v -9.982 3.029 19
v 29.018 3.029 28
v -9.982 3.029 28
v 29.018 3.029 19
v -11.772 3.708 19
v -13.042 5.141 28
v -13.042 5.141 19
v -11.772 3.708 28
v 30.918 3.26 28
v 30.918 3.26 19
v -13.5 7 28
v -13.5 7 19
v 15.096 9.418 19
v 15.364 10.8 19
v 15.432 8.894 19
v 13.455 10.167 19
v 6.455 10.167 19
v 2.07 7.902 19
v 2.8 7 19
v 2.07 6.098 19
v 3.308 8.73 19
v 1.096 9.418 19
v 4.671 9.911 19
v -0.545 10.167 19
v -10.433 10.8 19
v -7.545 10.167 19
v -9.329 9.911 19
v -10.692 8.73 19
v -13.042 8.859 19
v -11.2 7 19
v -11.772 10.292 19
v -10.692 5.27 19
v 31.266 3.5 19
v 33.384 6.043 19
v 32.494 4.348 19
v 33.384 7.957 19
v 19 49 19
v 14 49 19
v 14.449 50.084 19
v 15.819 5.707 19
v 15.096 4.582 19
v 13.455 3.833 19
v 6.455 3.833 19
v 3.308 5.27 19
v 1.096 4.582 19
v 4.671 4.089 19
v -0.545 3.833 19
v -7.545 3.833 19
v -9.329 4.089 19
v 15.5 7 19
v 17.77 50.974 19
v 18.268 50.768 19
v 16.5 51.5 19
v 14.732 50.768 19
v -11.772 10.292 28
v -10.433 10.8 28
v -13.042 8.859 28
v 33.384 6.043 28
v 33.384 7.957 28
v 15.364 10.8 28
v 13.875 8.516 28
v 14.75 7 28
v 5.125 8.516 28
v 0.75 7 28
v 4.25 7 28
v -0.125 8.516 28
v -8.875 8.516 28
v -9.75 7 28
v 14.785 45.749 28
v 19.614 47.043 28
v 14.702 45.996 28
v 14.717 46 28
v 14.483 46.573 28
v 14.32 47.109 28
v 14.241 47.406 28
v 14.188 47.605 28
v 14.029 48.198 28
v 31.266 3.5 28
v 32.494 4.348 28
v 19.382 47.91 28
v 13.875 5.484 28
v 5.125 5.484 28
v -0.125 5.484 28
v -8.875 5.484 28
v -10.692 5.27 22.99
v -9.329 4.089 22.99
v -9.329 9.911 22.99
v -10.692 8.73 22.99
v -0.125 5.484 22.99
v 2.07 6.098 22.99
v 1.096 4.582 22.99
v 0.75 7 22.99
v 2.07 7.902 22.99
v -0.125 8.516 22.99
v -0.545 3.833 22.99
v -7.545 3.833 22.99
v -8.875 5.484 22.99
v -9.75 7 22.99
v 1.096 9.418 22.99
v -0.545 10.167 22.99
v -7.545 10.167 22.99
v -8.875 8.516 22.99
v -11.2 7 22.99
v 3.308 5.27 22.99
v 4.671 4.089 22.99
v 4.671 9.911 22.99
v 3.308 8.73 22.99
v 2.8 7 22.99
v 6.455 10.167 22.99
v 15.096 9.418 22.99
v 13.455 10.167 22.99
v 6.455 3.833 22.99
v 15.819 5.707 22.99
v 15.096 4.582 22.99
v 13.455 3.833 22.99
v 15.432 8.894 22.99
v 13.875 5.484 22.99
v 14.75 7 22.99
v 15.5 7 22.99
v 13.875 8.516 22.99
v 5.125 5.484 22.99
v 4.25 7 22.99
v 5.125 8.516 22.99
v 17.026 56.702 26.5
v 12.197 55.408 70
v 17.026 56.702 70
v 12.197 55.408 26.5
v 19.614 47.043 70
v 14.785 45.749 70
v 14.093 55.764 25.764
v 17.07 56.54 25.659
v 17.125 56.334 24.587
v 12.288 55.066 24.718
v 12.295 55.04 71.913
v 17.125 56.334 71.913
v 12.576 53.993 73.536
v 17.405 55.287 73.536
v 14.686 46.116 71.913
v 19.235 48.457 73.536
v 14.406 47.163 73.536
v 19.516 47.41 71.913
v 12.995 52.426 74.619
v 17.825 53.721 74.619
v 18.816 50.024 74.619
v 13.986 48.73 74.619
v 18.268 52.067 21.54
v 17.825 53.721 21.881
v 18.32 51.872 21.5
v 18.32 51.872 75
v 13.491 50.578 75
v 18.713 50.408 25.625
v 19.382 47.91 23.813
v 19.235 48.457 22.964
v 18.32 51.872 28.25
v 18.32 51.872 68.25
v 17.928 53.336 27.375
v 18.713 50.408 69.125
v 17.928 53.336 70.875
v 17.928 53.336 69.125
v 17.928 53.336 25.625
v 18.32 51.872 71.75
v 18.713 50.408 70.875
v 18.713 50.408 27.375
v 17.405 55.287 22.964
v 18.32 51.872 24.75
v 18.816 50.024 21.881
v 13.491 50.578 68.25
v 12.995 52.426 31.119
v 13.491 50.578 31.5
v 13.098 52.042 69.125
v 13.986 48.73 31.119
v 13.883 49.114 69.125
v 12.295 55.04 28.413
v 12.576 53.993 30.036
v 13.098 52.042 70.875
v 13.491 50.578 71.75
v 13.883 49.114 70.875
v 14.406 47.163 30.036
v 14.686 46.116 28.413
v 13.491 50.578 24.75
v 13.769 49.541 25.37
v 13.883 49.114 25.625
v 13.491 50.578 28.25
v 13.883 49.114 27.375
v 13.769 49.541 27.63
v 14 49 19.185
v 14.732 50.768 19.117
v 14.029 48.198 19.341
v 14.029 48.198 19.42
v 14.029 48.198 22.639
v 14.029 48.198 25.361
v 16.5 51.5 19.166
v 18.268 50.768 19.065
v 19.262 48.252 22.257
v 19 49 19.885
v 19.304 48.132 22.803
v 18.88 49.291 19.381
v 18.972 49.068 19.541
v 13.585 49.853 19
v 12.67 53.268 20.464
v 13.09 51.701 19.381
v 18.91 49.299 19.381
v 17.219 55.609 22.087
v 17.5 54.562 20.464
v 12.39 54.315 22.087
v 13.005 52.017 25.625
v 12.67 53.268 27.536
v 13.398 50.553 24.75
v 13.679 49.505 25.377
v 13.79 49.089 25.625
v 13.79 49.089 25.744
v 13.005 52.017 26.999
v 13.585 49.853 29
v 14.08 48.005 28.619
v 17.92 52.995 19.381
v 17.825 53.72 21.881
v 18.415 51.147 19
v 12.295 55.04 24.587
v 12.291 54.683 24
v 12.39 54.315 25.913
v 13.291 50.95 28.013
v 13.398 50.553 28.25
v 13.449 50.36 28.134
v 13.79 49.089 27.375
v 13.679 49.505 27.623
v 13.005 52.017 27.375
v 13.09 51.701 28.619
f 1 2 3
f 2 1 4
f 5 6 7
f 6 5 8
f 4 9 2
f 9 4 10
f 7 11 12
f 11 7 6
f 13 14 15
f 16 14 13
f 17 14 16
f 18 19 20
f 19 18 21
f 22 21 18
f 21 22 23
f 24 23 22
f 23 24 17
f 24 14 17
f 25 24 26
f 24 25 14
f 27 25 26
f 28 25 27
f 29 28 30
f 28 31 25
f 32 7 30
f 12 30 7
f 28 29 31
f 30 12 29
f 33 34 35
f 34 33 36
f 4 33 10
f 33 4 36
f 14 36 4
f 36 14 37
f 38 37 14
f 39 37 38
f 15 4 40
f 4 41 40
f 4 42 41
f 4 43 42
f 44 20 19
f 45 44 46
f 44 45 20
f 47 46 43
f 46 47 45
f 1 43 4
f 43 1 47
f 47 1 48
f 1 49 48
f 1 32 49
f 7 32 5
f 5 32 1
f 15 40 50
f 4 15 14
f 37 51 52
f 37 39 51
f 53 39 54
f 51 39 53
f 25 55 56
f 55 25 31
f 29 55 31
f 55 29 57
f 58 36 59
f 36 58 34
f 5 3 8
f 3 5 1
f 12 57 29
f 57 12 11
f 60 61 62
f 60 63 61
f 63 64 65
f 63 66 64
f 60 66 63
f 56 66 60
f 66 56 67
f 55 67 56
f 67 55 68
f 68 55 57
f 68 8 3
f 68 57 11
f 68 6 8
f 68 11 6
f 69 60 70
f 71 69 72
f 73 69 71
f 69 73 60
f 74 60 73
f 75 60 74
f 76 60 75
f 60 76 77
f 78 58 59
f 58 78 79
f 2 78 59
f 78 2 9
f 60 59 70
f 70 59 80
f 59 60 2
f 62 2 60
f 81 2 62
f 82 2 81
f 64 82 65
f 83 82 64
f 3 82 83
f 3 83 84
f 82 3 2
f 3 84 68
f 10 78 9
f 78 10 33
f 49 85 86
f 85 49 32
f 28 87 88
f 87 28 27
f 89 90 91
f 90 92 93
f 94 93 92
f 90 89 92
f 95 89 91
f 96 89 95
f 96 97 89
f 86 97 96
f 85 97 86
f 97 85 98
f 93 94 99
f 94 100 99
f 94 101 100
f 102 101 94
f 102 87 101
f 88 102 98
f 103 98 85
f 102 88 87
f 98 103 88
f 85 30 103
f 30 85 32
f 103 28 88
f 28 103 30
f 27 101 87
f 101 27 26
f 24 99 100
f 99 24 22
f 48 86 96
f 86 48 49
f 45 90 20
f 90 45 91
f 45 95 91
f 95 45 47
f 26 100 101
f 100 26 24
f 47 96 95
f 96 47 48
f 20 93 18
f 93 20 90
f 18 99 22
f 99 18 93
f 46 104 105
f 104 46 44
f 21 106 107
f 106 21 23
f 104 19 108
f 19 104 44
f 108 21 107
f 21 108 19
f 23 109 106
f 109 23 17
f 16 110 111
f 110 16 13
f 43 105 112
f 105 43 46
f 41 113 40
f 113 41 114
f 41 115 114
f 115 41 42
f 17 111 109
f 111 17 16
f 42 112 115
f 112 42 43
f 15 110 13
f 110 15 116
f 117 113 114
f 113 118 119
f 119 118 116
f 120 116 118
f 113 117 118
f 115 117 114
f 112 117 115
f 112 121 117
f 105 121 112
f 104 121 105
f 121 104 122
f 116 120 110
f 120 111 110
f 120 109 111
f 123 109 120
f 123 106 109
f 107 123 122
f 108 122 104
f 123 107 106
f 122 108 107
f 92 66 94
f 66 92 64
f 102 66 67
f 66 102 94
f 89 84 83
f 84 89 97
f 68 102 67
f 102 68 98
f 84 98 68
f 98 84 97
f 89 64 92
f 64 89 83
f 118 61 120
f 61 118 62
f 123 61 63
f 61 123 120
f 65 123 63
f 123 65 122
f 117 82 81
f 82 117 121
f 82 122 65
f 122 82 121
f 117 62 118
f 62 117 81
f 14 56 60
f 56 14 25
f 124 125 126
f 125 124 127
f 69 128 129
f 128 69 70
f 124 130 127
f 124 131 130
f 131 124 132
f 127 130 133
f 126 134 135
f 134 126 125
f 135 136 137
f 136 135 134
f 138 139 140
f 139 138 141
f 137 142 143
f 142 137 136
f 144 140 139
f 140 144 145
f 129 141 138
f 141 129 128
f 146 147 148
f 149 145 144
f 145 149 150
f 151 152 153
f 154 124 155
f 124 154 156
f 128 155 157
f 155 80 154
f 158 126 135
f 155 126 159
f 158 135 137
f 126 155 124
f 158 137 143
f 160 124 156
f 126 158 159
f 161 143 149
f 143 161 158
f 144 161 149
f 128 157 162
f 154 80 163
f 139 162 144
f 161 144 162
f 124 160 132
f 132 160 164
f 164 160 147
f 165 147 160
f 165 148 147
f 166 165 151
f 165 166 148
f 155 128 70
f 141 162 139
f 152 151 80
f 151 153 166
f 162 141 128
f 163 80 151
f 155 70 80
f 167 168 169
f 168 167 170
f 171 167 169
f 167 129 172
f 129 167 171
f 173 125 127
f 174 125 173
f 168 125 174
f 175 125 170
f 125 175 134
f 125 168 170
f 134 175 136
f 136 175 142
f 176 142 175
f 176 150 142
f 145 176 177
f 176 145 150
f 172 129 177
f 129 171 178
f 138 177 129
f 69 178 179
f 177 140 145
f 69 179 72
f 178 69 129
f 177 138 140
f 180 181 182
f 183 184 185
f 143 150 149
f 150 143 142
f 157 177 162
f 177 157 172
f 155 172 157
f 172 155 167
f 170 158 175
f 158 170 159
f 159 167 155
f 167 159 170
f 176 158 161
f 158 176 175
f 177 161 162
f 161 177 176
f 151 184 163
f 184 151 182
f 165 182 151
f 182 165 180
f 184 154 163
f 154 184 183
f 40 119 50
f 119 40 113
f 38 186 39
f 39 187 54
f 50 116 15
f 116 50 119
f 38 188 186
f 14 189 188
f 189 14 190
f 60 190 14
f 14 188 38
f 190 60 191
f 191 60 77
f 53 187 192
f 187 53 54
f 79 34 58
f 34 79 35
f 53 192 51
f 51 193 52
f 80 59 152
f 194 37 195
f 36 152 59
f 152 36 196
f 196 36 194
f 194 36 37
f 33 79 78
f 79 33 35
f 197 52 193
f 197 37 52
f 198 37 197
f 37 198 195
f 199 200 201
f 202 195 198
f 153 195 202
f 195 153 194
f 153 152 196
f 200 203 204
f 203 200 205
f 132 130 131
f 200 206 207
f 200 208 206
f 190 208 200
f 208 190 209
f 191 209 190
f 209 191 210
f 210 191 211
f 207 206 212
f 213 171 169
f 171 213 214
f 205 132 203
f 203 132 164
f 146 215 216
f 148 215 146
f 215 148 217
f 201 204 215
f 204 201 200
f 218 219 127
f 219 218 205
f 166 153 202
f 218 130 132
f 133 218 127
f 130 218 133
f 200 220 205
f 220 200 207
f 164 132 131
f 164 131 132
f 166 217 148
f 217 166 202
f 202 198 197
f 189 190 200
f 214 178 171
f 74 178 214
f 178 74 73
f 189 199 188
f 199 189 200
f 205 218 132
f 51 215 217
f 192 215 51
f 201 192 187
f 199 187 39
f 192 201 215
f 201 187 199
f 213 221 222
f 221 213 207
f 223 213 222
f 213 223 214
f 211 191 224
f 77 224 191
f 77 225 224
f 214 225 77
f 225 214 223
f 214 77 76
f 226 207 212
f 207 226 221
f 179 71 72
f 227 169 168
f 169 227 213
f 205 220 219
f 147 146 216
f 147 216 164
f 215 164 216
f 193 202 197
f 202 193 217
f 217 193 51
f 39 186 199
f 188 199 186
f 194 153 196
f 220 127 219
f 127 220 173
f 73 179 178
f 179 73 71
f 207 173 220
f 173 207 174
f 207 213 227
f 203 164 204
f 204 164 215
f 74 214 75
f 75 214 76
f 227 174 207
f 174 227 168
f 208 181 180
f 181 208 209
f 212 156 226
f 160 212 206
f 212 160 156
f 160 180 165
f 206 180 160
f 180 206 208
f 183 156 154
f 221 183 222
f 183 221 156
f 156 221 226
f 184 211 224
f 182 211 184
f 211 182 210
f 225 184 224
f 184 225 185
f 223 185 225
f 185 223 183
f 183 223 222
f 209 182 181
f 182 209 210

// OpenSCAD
nozzle_w_t=1.2;
duct_w_t=nozzle_w_t;
nozzle_x =20;
nozzle_z= 6;
nozzle_y=5;
nozzle_taper_l=16;
duct_w=25;
duct_w2=38;
duct_h=20;
noz_a=20;
duct_a=-15;
duct_ir=32/2;
duct_depth=11;
m3r=1.75;
mount_c_h=6+duct_w_t+1;
mount_c_offset=duct_w/2+14;
mount_c_off_y=4;

nozzle_off_y=30;


module nozzle(right=1){
    difference(){
        //nozzle
        union(){
            hull(){
                rotate([noz_a,0,0])
                translate([0,0,0])
                    cube([nozzle_x,0.1,nozzle_z],center=true);
                translate([0,nozzle_y,0])
                    cube([nozzle_x,0.1,nozzle_z],center=true);
            }
            //fan interface
            hull(){
                translate([0,nozzle_y,0])
                    cube([nozzle_x,0.1,nozzle_z],center=true);
                translate([0,nozzle_taper_l-2,(nozzle_z-duct_h)/2])
                        cube([duct_w+nozzle_w_t*2,0.1,duct_h+nozzle_w_t*2],center=true);
                translate([(duct_w-duct_w2)/2,nozzle_taper_l+duct_depth,(nozzle_z-duct_h)/2])
                        cube([duct_w2+nozzle_w_t*2,0.1,duct_h+nozzle_w_t*2],center=true);            
            }
            //screw hole meat
            hull(){
                translate([-mount_c_offset,nozzle_taper_l+duct_depth-(m3r+2),-(duct_h-nozzle_z)/2-duct_h/2+mount_c_h/2-duct_w_t])
                cylinder(r=m3r+2, h=mount_c_h,center=true,$fn=20);
                translate([0,nozzle_taper_l+duct_depth-(m3r+2),-(duct_h-nozzle_z)/2-duct_h/2+mount_c_h/2-duct_w_t])
                cube([0.1,m3r*2+4,mount_c_h],center=true);
            }
            if(right){
                hull(){
                    translate([17,nozzle_taper_l+duct_depth-(m3r+2),-(duct_h-nozzle_z)/2])
                    cylinder(r=m3r+2, h=duct_h+duct_w_t*2,center=true,$fn=20);
                    translate([0,nozzle_taper_l+duct_depth-(m3r+2),-(duct_h-nozzle_z)/2])
                    cube([0.1,m3r*2+4,duct_h+duct_w_t*2],center=true);
                }
            }
        }      
        //nozzle cutout
        hull(){
            translate([0,-1,0])
            rotate([noz_a,0,0])
                cube([nozzle_x-nozzle_w_t*2,0.11,nozzle_z-nozzle_w_t*2],center=true);
            translate([0,nozzle_y+0.01,0])
                cube([nozzle_x-nozzle_w_t*2,0.11,nozzle_z-nozzle_w_t*2],center=true);

        }
        //fan interface cutout      
        hull(){
          translate([0,nozzle_y-0.01,0])
                cube([nozzle_x-nozzle_w_t*2,0.11,nozzle_z-nozzle_w_t*2],center=true);
            translate([0,nozzle_taper_l-0.01,(nozzle_z-duct_h)/2])
                    cube([duct_w,0.1,duct_h],center=true);
            translate([(duct_w-duct_w2)/2,nozzle_taper_l+duct_depth+0.01,(nozzle_z-duct_h)/2])
                    cube([duct_w2,0.1,duct_h],center=true);            
        }
        //screw hole
                translate([-mount_c_offset,nozzle_taper_l+duct_depth-(m3r+2),-(duct_h-nozzle_z)/2-duct_h/2+mount_c_h/2-duct_w_t])
                cylinder(r=m3r, h=mount_c_h+0.1,center=true,$fn=12);
            if(right){
                translate([17,nozzle_taper_l+duct_depth-(m3r+2),-(duct_h-nozzle_z)/2])
                cylinder(r=m3r, h=duct_h+duct_w_t*2+0.1,center=true,$fn=20);
            }        
        //cutout
       translate([-mount_c_offset,nozzle_taper_l+duct_depth-(m3r+2)+3,-(duct_h-nozzle_z)/2+mount_c_h/2])
        cube([12,12,duct_h-mount_c_h+duct_w_t*2+0.1],center=true);
        //cutout
        translate([duct_w/2,nozzle_taper_l+duct_depth-(m3r+2)+3,-(duct_h-nozzle_z)/2])
        cube([10,8,3],center=true); 
    }
    //vane
    hull(){
        rotate([noz_a,0,0])
        cube([0.8,0.1,nozzle_z],center=true);
        translate([0,nozzle_y,0])
            cube([0.8,0.1,nozzle_z],center=true);
    }
    hull(){
        translate([0,nozzle_y,0])
            cube([0.8,0.1,nozzle_z],center=true);
        translate([0,nozzle_taper_l-2,(nozzle_z-duct_h)/2])
            cube([0.8,0.1,duct_h+nozzle_w_t*2],center=true);
    }
    #hull(){
        translate([0,nozzle_taper_l-2,(nozzle_z-duct_h)/2])
            cube([0.8,0.1,duct_h+nozzle_w_t*2],center=true);
        translate([(duct_w-duct_w2)/2+4,nozzle_taper_l+duct_depth-8,(nozzle_z-duct_h)/2])
            cube([0.8,0.1,duct_h+nozzle_w_t*2],center=true);
    }
}

mount_x=9;
mount_y=8;
mount_z=34;
mount_off_y=7;
mount_off_x=-42;
mount_off_z=-mount_z/2+mount_c_offset-2;
m3hr=3.2;
m3hh=4;
m3hz=7;

module mountL(){
        union(){
            //mount to carriage
            translate([mount_off_x,mount_off_y,mount_off_z])
            difference(){
               hull(){
                    translate([0,0,-(mount_z)/2])
                        rotate([0,90,0])
                            cylinder(r=mount_y/2, h=mount_x,center=true);
                    translate([0,0,(mount_z)/2+5])
                        rotate([0,90,0])
                            cylinder(r=mount_y/2, h=mount_x,center=true);
                }

                translate([0,0,-m3hz-5])
                hull(){
                    translate([-mount_x/2+m3hh/2-0.01,0,-(m3hz)/2])
                        rotate([0,90,0])
                            cylinder(r=m3hr, h=m3hh,center=true);
                    translate([-mount_x/2+m3hh/2-0.01,0,(m3hz)/2])
                        rotate([0,90,0])
                            cylinder(r=m3hr, h=m3hh,center=true);
                }
                translate([0,0,m3hz-5])
                hull(){
                    translate([-mount_x/2+m3hh/2-0.01,0,-(m3hz)/2])
                        rotate([0,90,0])
                            cylinder(r=m3hr, h=m3hh,center=true);
                    translate([-mount_x/2+m3hh/2-0.01,0,(m3hz)/2])
                        rotate([0,90,0])
                            cylinder(r=m3hr, h=m3hh,center=true);
                }
                translate([0,0,-m3hz-5])
                hull(){
                    translate([0,0,-(m3hz)/2])
                        rotate([0,90,0])
                            cylinder(r=m3r, h=mount_x+0.1,center=true);
                    translate([0,0,(m3hz)/2])
                        rotate([0,90,0])
                            cylinder(r=m3r, h=mount_x+0.1,center=true);
                }
                translate([0,0,m3hz-5])
                hull(){
                    translate([0,0,-(m3hz)/2])
                        rotate([0,90,0])
                            cylinder(r=m3r, h=mount_x+0.1,center=true);
                    translate([0,0,(m3hz)/2])
                        rotate([0,90,0])
                            cylinder(r=m3r, h=mount_x+0.1,center=true);
                }
                    translate([0,-mount_y/2-1.8,(mount_z)/2-12])
                        cube([10,4,mount_z+20],center=true);
            }
            //mount to fan

            translate([0,nozzle_off_y,+13])
                rotate([duct_a,0,0])
                   translate([-mount_c_offset,nozzle_taper_l+duct_depth-(m3r+2),(nozzle_z-duct_h)/2+duct_h/2+duct_w_t+mount_c_h/2])
                        difference(){
                        translate([0,17.5,0])
                            hull(){
                                translate([0,-44/2,0])
                                    cylinder(r=5, h=5,center=true);
                                translate([0,37.5/2,0])
                                    cylinder(r=5, h=5,center=true);
                            }   
                        translate([0,0,0])
                            cylinder(r=m3r, h=5+0.1,center=true); 
                        translate([0,35,0])
                            cylinder(r=m3r, h=5+0.1,center=true); 
                    }
            
          
            difference(){
                union(){
                    hull(){
                        translate([mount_off_x,mount_off_y,mount_off_z])
                            translate([0,0,(mount_z)/2+5])
                                rotate([0,90,0])
                                    cylinder(r=mount_y/2, h=mount_x,center=true);
                        translate([mount_off_x,mount_off_y,mount_off_z])
                            translate([0,0,(mount_z)/2-5])
                                rotate([0,90,0])
                                    cylinder(r=mount_y/2, h=mount_x,center=true);
                        #translate([mount_off_x,mount_off_y,mount_off_z])
                            translate([0,nozzle_off_y+12,(mount_z)/2-9.25])
                                rotate([0,90,0])
                                    cylinder(r=2.5, h=mount_x,center=true);
                    }
                    hull(){
                        translate([mount_off_x,mount_off_y,mount_off_z])
                            translate([0,nozzle_off_y+12,(mount_z)/2-9.25]){
                                rotate([0,90,0])
                                    cylinder(r=2.5, h=mount_x,center=true);
                                translate([2,0,0])
                                rotate([duct_a,0,0])
                                    cylinder(r=5, h=5,center=true);
                            }
                        translate([0,nozzle_off_y,+13])
                            rotate([duct_a,0,0])
                                translate([-mount_c_offset,nozzle_taper_l+duct_depth-(m3r+2),(nozzle_z-duct_h)/2+duct_h/2+duct_w_t+mount_c_h/2])
                                    translate([0,-44/2+17.5,0])
                                        cylinder(r=5, h=5,center=true);
                    }
                }
                translate([0,nozzle_off_y,+13])
                    rotate([duct_a,0,0])
                       translate([-mount_c_offset,nozzle_taper_l+duct_depth-(m3r+2),(nozzle_z-duct_h)/2+duct_h/2+duct_w_t+mount_c_h/2]){
                                    cylinder(r=m3r, h=12,center=true);
                                    translate([0,0,-7.51])
                                        cube([12,20,10],center=true);
                                    translate([0,0,+7.51])
                                        cube([50,20,10],center=true);
                       }

                    translate([mount_off_x,mount_off_y,mount_off_z])
                        translate([9.5,0,(mount_z)/2+8])
                            cube([10,12,16],center=true);
                    translate([mount_off_x,mount_off_y,mount_off_z])
                        translate([0,-mount_y/2-1.5,(mount_z)/2-12])
                            cube([10,4,mount_z+20],center=true);

            }
        }
}
mount_off_xR =-23.5;
module mountR(){
        union(){
            //mount to carriage
            translate([mount_off_xR,mount_off_y,mount_off_z])rotate([0,0,180])
            difference(){
               hull(){
                    translate([0,0,-(mount_z)/2])
                        rotate([0,90,0])
                            cylinder(r=mount_y/2, h=mount_x,center=true);
                    translate([0,0,(mount_z)/2+5])
                        rotate([0,90,0])
                            cylinder(r=mount_y/2, h=mount_x,center=true);
                }

                translate([0,0,-m3hz-5])
                hull(){
                    translate([-mount_x/2+m3hh/2-0.01,0,-(m3hz)/2])
                        rotate([0,90,0])
                            cylinder(r=m3hr, h=m3hh,center=true);
                    translate([-mount_x/2+m3hh/2-0.01,0,(m3hz)/2])
                        rotate([0,90,0])
                            cylinder(r=m3hr, h=m3hh,center=true);
                }
                translate([0,0,m3hz-5])
                hull(){
                    translate([-mount_x/2+m3hh/2-0.01,0,-(m3hz)/2])
                        rotate([0,90,0])
                            cylinder(r=m3hr, h=m3hh,center=true);
                    translate([-mount_x/2+m3hh/2-0.01,0,(m3hz)/2])
                        rotate([0,90,0])
                            cylinder(r=m3hr, h=m3hh,center=true);
                }
                translate([0,0,-m3hz-5])
                hull(){
                    translate([0,0,-(m3hz)/2])
                        rotate([0,90,0])
                            cylinder(r=m3r, h=mount_x+0.1,center=true);
                    translate([0,0,(m3hz)/2])
                        rotate([0,90,0])
                            cylinder(r=m3r, h=mount_x+0.1,center=true);
                }
                translate([0,0,m3hz-5])
                hull(){
                    translate([0,0,-(m3hz)/2])
                        rotate([0,90,0])
                            cylinder(r=m3r, h=mount_x+0.1,center=true);
                    translate([0,0,(m3hz)/2])
                        rotate([0,90,0])
                            cylinder(r=m3r, h=mount_x+0.1,center=true);
                }
                    translate([0,-mount_y/2-1.8,(mount_z)/2-12])
                        cube([10,4,mount_z+20],center=true);
            }
            //mount to fan

            translate([0,nozzle_off_y,+13])
                rotate([duct_a,0,0])
                   translate([-mount_c_offset,nozzle_taper_l+duct_depth-(m3r+2),(nozzle_z-duct_h)/2+duct_h/2+duct_w_t+mount_c_h/2])
                        difference(){
                            hull(){
                                translate([0,-3.5,0])
                                    cylinder(r=5, h=5,center=true);
                                translate([-43.5,-3.5,0])
                                    cylinder(r=5, h=5,center=true);
                            }    
                            translate([-43.5,-3.5,0])
                                cylinder(r=m3r, h=5+0.1,center=true); 
                            translate([0,-3.5,0])
                                cylinder(r=m3r, h=5+0.1,center=true); 
                    }
            
          
            difference(){
                union(){
                    translate([mount_off_xR,mount_off_y,mount_off_z])
                    hull(){
                            translate([0,0,(mount_z)/2+5])
                                rotate([0,90,0])
                                    cylinder(r=mount_y/2, h=mount_x,center=true);
                            translate([0,0,(mount_z)/2-5])
                                rotate([0,90,0])
                                    cylinder(r=mount_y/2, h=mount_x,center=true);
                            translate([0,nozzle_off_y+12,(mount_z)/2-8])
                                rotate([0,90,0])
                                    cylinder(r=2.5, h=mount_x,center=true);
                    }
                    hull(){
                        translate([mount_off_xR,mount_off_y,mount_off_z])
                            translate([0,nozzle_off_y+12,(mount_z)/2-8.5]){
                                translate([-0.5,1.5,0])
                                rotate([duct_a,0,0])
                                    cylinder(r=5, h=5,center=true);
                            }
                        translate([0,nozzle_off_y,+13])
                            rotate([duct_a,0,0])
                                translate([-mount_c_offset,nozzle_taper_l+duct_depth-(m3r+2),(nozzle_z-duct_h)/2+duct_h/2+duct_w_t+mount_c_h/2])
                                    translate([0,-3.5,0])
                                        cylinder(r=5, h=5,center=true);
                    }
                }
                translate([0,nozzle_off_y,+13])
                    rotate([duct_a,0,0])
                       translate([-mount_c_offset,nozzle_taper_l+duct_depth-(m3r+2)-3.5,(nozzle_z-duct_h)/2+duct_h/2+duct_w_t+mount_c_h/2]){
                                    cylinder(r=m3r, h=12,center=true);
                       }


                    translate([mount_off_xR,mount_off_y,mount_off_z])
                        translate([0,-mount_y/2-1.5,(mount_z)/2-12])
                            cube([10,4,mount_z+20],center=true);

            }
        }
}


//Left Assembly
if(0){
    mountL();
    translate([0,nozzle_off_y,0])
    rotate([duct_a,0,0])
    nozzle();
}
//Right Assembly
else if(0){
    mountR();
    translate([mount_off_xR-20,nozzle_off_y+7,41])
    rotate([duct_a,0,0])
    nozzle(1);
}
//Leftnozzle
else if(0) {
    rotate([-90,0,0])
    nozzle(0);

}
//Right nozzle
else if(0) {
    rotate([-90,0,0])
    nozzle(1);

}
else if (0){
    rotate([0,-90,0])
        mountL();
}
else if (1){
    rotate([0,90,0])
        mountR();
}
